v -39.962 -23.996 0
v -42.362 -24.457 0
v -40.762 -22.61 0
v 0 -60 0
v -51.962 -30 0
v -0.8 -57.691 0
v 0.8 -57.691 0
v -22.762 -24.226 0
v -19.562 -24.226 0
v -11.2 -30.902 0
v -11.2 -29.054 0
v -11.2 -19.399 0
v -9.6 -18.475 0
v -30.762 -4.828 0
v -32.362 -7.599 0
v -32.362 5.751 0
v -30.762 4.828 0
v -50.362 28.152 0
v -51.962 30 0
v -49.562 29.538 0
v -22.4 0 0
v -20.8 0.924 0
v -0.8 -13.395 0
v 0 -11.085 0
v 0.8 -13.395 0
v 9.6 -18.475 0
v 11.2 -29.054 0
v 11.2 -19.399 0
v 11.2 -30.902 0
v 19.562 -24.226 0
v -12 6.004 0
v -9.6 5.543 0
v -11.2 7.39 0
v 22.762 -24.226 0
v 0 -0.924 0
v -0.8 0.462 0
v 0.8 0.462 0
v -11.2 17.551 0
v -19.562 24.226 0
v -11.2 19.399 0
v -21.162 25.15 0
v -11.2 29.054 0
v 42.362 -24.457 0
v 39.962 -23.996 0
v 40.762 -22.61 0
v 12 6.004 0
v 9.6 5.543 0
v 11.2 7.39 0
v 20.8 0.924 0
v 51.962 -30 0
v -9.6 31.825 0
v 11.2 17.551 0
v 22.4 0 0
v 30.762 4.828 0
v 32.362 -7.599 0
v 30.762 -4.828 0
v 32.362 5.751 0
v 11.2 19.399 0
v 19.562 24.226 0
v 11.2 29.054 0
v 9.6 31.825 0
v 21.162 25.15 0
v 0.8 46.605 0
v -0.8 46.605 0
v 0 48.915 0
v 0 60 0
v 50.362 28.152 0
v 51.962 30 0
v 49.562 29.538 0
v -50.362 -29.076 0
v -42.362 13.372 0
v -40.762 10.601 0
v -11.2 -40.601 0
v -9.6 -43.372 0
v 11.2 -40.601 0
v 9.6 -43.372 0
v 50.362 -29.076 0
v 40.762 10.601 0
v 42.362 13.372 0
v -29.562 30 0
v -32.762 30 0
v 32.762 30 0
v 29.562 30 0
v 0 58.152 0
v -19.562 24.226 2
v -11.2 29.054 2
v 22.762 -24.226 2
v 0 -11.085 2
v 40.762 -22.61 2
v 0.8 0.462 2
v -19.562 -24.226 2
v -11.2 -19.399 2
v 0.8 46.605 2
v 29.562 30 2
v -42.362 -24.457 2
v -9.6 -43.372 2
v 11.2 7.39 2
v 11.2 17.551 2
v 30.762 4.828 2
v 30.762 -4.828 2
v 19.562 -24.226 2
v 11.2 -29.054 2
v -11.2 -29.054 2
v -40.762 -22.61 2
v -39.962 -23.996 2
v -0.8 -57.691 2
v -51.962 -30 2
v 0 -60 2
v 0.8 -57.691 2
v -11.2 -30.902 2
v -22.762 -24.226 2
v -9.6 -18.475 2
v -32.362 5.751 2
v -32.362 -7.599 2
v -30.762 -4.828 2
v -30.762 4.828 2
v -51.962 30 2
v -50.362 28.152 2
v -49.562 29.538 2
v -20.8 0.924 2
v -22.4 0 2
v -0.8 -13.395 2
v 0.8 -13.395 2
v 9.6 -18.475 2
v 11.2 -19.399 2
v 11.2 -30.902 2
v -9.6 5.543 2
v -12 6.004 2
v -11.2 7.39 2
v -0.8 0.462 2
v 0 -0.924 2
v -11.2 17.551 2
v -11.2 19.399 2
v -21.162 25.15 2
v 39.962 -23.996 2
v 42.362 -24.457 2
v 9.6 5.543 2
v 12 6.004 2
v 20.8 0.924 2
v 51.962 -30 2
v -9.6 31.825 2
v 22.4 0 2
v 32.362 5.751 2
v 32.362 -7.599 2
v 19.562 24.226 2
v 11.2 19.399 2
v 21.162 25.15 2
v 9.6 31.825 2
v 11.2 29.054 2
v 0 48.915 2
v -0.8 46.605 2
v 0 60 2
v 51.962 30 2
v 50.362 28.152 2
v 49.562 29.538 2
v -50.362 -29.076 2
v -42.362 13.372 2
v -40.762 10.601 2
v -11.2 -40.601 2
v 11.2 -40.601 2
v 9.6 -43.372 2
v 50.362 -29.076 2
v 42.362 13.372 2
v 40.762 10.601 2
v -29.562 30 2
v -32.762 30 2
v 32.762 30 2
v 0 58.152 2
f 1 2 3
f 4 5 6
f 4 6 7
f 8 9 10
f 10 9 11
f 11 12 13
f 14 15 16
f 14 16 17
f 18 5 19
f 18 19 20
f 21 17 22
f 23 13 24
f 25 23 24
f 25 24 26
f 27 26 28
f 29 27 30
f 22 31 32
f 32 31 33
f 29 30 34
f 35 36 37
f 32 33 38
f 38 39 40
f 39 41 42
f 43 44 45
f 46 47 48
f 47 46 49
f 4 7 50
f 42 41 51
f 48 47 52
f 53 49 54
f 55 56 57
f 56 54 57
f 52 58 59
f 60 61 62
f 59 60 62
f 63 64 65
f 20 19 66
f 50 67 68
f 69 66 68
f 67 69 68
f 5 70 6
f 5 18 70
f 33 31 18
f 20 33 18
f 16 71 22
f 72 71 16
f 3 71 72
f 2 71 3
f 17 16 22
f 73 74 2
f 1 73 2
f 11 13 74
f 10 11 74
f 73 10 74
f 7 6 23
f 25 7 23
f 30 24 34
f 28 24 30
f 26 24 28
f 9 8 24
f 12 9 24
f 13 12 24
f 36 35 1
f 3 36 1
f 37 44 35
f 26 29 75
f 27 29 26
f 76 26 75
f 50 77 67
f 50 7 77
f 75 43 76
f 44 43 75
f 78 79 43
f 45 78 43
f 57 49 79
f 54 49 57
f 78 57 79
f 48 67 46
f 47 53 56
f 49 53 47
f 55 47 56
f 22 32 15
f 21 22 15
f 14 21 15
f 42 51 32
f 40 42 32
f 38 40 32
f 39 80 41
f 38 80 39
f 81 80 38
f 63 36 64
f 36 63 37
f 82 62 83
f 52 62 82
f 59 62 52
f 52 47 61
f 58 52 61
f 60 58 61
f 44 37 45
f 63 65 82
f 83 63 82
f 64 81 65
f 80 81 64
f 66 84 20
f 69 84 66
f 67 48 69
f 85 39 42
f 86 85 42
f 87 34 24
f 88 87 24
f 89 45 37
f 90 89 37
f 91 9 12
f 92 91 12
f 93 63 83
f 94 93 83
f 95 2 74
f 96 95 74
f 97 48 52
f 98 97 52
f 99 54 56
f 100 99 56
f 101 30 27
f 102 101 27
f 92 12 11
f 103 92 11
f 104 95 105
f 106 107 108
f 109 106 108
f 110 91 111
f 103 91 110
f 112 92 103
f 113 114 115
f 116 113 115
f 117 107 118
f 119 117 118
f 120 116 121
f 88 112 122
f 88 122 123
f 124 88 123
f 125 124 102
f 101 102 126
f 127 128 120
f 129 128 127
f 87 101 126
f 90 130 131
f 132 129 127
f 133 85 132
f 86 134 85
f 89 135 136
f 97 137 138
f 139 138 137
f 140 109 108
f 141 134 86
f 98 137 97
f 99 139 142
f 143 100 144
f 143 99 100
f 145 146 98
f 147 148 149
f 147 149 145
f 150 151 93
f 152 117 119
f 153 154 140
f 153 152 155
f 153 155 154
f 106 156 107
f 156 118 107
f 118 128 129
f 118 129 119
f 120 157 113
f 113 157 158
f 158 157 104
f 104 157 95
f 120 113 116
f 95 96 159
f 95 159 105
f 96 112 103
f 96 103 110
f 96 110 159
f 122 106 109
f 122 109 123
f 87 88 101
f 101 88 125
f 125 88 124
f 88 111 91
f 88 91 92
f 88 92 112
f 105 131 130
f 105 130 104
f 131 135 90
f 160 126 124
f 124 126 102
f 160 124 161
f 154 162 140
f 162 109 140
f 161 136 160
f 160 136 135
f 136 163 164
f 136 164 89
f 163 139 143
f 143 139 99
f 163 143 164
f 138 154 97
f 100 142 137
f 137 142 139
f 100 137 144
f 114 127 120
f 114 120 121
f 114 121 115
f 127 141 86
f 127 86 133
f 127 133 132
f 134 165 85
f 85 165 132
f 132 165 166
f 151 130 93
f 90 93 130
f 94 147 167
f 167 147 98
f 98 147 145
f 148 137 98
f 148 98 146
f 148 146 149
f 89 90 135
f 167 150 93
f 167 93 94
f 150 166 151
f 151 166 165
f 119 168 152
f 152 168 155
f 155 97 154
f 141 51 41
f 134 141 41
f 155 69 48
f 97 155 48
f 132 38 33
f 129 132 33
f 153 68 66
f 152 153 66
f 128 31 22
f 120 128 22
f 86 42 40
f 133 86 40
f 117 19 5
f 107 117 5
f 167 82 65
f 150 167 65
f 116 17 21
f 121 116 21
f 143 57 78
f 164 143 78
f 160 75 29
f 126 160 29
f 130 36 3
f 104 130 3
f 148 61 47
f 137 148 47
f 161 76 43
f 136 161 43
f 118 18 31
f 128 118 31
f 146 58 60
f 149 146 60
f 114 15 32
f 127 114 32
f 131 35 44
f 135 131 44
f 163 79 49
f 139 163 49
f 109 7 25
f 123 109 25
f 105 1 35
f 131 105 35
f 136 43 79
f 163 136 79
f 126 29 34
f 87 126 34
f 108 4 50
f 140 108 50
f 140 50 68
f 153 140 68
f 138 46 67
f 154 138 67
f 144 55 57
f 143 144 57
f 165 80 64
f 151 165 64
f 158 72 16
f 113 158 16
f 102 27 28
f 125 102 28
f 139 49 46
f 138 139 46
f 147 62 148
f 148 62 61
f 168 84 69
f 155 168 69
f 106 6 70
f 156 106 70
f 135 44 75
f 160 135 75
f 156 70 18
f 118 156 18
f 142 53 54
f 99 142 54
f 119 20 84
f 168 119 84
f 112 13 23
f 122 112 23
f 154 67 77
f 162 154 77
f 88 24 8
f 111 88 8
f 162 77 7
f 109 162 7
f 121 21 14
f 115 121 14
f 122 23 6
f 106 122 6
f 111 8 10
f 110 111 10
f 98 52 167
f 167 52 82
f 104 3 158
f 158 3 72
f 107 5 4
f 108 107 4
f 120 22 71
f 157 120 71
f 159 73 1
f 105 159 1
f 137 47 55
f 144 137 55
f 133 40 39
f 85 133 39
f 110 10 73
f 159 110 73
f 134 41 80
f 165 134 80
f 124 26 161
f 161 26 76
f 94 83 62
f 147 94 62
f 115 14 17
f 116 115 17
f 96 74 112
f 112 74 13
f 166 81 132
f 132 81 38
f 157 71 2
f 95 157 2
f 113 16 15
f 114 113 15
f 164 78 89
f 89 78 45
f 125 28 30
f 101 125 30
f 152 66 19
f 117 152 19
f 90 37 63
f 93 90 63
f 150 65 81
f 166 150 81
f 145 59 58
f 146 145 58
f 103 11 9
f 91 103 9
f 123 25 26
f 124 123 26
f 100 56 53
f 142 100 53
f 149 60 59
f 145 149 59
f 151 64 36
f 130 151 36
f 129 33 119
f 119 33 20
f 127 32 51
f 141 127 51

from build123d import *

# Parameters (mm, degrees)
F1_DEPTH = 2


with BuildPart() as f1:
    # F0 (on Top) → F1 (new body)
    with BuildSketch(Plane.XY):
        Polygon((0, 60), (-51.961524, 30), (-51.961524, -30), (0, -60), (51.961524, -30), (51.961524, 30), align=None)
        Polygon((-11.2, -19.398969), (-11.2, -29.054026), (-19.561524, -24.226497), align=None, mode=Mode.SUBTRACT)
        Polygon((-50.361524, -29.07624), (-50.361524, 28.152479), (-12, 6.004443), (-20.8, 0.92376), (-42.361524, 13.372312), (-42.361524, -24.457437), (-9.6, -43.372312), (-9.6, -18.475209), (-0.8, -13.394526), (-0.8, -57.690599), align=None, mode=Mode.SUBTRACT)
        Polygon((0, -11.085125), (-22.761524, -24.226497), (-11.2, -30.901546), (-11.2, -40.601031), (-39.961524, -23.995557), (0, -0.92376), (39.961524, -23.995557), (11.2, -40.601031), (11.2, -30.901546), (22.761524, -24.226497), align=None, mode=Mode.SUBTRACT)
        Polygon((11.2, -19.398969), (19.561524, -24.226497), (11.2, -29.054026), align=None, mode=Mode.SUBTRACT)
        Polygon((50.361524, -29.07624), (0.8, -57.690599), (0.8, -13.394526), (9.6, -18.475209), (9.6, -43.372312), (42.361524, -24.457437), (42.361524, 13.372312), (20.8, 0.92376), (12, 6.004443), (50.361524, 28.152479), align=None, mode=Mode.SUBTRACT)
        Polygon((-22.4, 0), (-30.761524, -4.827528), (-30.761524, 4.827528), align=None, mode=Mode.SUBTRACT)
        Polygon((-40.761524, -22.609917), (-40.761524, 10.601031), (-32.361524, 5.751289), (-32.361524, -7.59881), (-9.6, 5.542563), (-9.6, 31.825307), (-21.161524, 25.150258), (-29.561524, 30), (-0.8, 46.605474), (-0.8, 0.46188), align=None, mode=Mode.SUBTRACT)
        Polygon((-11.2, 29.054026), (-11.2, 19.398969), (-19.561524, 24.226497), align=None, mode=Mode.SUBTRACT)
        Polygon((0, 48.914875), (-32.761524, 30), (-11.2, 17.551448), (-11.2, 7.390083), (-49.561524, 29.53812), (0, 58.152479), (49.561524, 29.53812), (11.2, 7.390083), (11.2, 17.551448), (32.761524, 30), align=None, mode=Mode.SUBTRACT)
        Polygon((0.8, 46.605474), (29.561524, 30), (21.161524, 25.150258), (9.6, 31.825307), (9.6, 5.542563), (32.361524, -7.59881), (32.361524, 5.751289), (40.761524, 10.601031), (40.761524, -22.609917), (0.8, 0.46188), align=None, mode=Mode.SUBTRACT)
        Polygon((19.561524, 24.226497), (11.2, 19.398969), (11.2, 29.054026), align=None, mode=Mode.SUBTRACT)
        Polygon((30.761524, -4.827528), (22.4, 0), (30.761524, 4.827528), align=None, mode=Mode.SUBTRACT)
    extrude(amount=F1_DEPTH)


solid = f1.part
